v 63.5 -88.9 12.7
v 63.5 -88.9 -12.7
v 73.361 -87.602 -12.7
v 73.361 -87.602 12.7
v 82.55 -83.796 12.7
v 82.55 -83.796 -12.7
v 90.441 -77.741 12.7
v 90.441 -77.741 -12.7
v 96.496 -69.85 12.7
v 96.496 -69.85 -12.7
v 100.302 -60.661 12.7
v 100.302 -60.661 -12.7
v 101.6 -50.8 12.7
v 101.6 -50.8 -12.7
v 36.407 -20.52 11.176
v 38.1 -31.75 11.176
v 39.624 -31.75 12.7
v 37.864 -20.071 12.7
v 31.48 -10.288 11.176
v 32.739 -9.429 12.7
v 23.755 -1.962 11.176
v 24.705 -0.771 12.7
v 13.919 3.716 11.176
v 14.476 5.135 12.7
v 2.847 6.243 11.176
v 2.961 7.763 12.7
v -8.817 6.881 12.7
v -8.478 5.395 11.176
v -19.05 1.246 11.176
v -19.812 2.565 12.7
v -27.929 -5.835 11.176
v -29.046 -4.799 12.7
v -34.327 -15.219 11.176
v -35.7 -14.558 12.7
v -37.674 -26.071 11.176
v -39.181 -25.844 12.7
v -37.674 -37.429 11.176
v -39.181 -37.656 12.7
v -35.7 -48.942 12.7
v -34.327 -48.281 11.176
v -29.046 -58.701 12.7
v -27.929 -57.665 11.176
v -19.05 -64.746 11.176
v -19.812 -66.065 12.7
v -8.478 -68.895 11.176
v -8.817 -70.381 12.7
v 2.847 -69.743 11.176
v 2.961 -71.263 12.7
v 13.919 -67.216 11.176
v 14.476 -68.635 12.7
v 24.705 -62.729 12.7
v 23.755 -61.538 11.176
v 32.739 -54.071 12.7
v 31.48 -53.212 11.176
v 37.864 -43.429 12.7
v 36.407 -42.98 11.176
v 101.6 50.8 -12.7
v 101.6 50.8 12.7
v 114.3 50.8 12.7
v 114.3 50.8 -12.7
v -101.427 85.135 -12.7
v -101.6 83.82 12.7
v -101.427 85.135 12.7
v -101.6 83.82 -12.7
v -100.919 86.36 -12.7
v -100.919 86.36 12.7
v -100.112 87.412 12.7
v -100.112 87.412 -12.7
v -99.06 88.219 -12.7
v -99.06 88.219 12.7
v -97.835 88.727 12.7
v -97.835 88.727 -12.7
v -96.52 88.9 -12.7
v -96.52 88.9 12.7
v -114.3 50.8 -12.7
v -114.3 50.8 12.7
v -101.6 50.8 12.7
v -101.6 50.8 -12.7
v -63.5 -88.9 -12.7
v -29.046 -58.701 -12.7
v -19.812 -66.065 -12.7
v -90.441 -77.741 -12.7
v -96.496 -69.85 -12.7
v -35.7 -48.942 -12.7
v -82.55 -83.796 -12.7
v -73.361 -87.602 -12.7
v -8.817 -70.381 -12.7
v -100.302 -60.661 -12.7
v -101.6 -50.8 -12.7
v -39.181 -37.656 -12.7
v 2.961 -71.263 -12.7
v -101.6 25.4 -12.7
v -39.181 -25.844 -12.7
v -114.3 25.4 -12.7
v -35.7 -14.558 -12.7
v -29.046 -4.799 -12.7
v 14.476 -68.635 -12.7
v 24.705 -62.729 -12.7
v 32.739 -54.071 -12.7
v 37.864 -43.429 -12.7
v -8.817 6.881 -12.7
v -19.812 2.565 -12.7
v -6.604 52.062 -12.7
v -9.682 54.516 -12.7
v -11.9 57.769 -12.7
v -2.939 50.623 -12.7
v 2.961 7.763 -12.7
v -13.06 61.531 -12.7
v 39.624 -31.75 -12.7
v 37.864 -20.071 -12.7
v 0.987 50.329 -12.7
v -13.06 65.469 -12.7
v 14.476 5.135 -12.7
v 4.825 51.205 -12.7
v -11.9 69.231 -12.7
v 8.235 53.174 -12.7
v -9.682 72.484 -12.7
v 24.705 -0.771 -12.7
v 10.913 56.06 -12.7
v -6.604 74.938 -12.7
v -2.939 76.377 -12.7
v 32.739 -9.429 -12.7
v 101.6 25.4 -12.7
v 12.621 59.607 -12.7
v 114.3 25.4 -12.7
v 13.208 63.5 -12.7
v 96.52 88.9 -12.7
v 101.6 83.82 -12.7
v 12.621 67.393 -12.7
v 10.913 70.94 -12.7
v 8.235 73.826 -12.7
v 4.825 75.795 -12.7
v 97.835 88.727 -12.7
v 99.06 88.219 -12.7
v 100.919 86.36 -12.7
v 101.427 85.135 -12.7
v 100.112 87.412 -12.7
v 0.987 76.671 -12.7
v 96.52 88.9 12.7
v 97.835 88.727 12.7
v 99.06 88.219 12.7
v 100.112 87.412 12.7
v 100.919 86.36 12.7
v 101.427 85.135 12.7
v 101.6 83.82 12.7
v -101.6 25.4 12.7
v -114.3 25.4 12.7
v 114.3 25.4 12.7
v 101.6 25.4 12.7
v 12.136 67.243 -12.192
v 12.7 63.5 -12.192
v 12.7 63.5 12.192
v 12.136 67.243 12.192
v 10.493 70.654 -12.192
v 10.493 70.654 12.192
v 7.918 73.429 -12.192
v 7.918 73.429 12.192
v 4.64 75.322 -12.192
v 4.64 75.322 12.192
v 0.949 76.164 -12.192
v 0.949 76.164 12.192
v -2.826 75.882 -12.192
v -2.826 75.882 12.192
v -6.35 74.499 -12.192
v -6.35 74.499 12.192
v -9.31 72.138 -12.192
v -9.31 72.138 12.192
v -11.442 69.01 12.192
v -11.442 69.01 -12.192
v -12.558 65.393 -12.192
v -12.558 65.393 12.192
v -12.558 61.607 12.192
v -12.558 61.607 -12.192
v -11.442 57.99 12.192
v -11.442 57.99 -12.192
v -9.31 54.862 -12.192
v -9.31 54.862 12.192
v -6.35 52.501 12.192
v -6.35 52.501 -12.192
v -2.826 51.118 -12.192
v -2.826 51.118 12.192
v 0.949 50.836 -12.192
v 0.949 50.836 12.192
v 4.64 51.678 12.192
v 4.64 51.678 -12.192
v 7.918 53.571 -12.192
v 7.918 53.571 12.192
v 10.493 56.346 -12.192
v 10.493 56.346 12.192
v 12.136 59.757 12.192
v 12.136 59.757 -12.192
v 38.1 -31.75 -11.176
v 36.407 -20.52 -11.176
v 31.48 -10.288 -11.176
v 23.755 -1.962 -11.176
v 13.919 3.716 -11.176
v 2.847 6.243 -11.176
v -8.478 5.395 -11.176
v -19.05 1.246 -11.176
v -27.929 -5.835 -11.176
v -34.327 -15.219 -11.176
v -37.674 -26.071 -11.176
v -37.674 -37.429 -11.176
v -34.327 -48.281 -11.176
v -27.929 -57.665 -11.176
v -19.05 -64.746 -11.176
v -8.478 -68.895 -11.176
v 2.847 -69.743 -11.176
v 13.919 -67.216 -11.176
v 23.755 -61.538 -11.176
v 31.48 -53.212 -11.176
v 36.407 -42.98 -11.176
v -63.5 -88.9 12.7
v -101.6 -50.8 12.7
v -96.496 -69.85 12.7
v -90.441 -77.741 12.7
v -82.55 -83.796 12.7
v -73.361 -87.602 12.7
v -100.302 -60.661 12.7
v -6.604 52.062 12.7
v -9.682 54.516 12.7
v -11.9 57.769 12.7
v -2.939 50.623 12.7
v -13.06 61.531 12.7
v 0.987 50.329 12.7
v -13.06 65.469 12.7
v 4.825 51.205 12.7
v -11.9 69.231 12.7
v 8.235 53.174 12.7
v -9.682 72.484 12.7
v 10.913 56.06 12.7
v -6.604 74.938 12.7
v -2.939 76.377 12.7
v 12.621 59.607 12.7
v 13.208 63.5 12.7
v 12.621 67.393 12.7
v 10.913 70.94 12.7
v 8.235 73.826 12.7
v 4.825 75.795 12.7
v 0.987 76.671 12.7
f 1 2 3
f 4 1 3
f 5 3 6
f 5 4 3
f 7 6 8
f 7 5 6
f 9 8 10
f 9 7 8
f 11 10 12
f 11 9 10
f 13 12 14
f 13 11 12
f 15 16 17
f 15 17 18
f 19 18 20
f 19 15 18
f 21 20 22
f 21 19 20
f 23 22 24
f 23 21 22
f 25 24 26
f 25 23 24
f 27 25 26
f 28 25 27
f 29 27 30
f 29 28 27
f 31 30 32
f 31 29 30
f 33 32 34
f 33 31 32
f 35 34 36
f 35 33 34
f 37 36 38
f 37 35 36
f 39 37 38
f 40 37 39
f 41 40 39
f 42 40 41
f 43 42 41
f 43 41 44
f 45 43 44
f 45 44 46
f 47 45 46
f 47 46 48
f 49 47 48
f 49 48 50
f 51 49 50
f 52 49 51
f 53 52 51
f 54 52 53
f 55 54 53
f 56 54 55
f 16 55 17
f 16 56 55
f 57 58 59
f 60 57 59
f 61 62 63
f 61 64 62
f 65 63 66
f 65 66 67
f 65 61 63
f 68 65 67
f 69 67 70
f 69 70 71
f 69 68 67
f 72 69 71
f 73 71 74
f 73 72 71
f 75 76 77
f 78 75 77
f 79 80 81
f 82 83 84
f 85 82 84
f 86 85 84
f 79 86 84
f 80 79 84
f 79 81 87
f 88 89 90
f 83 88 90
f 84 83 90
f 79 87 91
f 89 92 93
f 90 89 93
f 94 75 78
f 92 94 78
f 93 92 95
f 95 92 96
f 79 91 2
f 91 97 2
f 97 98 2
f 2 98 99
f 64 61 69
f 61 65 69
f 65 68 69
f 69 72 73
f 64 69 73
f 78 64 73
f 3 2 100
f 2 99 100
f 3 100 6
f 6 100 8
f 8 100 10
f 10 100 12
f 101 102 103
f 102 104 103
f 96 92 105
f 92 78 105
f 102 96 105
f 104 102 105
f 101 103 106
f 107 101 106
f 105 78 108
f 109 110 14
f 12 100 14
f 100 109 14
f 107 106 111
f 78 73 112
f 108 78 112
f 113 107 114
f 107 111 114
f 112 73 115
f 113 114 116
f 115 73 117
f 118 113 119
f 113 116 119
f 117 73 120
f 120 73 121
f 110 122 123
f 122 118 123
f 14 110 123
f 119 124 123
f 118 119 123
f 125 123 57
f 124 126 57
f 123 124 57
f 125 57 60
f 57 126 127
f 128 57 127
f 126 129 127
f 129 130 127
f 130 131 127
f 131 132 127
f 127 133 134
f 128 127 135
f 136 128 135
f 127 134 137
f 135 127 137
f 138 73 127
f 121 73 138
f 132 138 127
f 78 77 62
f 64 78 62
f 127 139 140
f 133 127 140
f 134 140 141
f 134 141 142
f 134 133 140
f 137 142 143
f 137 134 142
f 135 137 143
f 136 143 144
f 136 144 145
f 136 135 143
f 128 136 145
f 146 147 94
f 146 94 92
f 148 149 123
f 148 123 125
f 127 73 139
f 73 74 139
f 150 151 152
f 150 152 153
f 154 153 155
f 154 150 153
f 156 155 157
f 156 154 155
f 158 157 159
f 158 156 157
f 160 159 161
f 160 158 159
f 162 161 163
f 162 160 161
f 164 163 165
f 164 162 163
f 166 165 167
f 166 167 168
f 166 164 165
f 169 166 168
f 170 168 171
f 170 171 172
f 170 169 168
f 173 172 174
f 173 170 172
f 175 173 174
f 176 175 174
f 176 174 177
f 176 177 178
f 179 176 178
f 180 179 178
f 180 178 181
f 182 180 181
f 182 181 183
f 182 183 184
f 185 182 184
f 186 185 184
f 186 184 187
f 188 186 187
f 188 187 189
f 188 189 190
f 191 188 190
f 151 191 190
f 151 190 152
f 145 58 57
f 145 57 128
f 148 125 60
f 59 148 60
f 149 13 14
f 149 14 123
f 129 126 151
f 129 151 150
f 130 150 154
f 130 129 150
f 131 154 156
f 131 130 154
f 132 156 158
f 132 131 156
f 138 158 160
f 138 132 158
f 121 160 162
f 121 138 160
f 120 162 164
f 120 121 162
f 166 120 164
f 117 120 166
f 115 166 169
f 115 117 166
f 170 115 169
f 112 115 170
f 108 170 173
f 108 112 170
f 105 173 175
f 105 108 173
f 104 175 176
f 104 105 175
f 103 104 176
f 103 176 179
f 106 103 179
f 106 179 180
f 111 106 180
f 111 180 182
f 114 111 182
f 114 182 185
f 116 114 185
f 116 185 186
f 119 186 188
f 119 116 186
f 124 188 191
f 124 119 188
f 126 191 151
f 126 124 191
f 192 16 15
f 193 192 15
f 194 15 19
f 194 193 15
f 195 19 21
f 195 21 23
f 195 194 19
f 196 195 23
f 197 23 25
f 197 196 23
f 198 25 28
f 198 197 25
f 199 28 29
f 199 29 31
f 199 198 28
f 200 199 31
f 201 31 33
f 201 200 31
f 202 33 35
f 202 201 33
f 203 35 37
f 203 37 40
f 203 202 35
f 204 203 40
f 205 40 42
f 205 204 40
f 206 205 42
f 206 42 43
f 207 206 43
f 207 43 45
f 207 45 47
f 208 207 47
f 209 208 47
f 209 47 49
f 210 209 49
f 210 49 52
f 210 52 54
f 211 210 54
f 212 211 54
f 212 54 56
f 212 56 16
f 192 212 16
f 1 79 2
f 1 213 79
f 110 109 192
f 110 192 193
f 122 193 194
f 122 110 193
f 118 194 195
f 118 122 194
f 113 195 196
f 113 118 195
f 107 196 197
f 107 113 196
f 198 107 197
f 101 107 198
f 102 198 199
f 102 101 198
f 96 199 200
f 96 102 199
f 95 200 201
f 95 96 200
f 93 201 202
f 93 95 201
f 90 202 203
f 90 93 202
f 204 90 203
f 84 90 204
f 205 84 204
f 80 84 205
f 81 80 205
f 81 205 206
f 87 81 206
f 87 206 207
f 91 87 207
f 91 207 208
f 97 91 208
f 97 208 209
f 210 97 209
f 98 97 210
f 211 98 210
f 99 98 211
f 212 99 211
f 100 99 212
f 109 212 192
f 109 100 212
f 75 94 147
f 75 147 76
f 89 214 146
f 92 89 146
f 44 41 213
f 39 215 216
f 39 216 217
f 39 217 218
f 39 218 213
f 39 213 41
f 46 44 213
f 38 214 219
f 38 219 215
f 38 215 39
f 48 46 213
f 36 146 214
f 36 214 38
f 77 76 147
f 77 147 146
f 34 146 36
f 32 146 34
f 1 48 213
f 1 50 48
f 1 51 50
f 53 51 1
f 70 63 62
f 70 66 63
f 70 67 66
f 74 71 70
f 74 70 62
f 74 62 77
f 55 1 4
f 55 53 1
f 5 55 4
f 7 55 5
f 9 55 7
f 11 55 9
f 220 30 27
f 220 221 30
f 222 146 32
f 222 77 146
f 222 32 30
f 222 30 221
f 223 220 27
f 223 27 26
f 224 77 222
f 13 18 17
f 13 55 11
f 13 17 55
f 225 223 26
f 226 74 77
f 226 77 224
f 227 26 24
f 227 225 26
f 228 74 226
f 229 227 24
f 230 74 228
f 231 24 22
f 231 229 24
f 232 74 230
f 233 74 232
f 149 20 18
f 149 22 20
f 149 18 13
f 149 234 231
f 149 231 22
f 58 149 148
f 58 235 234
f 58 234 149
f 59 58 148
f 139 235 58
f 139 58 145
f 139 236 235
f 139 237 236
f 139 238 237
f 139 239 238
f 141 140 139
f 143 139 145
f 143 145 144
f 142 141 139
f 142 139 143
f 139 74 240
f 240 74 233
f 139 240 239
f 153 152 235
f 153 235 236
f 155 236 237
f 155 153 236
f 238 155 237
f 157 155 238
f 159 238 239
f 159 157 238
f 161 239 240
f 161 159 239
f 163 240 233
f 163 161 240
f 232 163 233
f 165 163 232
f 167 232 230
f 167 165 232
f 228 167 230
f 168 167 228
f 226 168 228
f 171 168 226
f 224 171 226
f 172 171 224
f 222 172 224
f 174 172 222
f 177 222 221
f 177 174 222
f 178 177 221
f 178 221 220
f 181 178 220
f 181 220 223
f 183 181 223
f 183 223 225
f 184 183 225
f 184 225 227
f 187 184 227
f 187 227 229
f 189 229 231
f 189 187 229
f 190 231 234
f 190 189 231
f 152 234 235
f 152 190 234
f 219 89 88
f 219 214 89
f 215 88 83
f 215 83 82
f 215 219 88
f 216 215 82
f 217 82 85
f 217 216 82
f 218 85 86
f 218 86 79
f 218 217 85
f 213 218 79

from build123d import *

# Parameters (mm, degrees)
F0_W     = 203.2
F0_H     = 177.8
F0_R     = 38.1
F0_R_2   = 12.7
F1_DEPTH = 12.7
F2_SIZE  = 0.508
F3_SIZE  = 1.524
F4_R     = 38.1
F5_R     = 5.08
F6_W     = 12.7
F6_H     = 25.4
F7_DEPTH = 25.4


with BuildPart() as f1:
    # F0 (on Top) → F1 (new body, symmetric)
    with BuildSketch(Plane.XY):
        Rectangle(F0_W, F0_H)
        with Locations((0, -31.75)):
            Circle(F0_R, mode=Mode.SUBTRACT)
        with Locations((0, 63.5)):
            Circle(F0_R_2, mode=Mode.SUBTRACT)
    extrude(amount=F1_DEPTH, both=True)

    # F2
    f2_edges = [f1.edges().sort_by_distance(p)[0] for p in [
        (-12.7, 63.5, 12.7),
        (-12.7, 63.5, -12.7),
    ]]
    chamfer(f2_edges, length=F2_SIZE)

    # F3
    f3_edges = [f1.edges().sort_by_distance(p)[0] for p in [
        (-38.1, -31.75, 12.7),
        (-38.1, -31.75, -12.7),
    ]]
    chamfer(f3_edges, length=F3_SIZE)

    # F4
    f4_edges = [f1.edges().sort_by_distance(p)[0] for p in [
        (-101.6, -88.9, 0),
        (101.6, -88.9, 0),
    ]]
    fillet(f4_edges, radius=F4_R)

    # F5
    f5_edges = [f1.edges().sort_by_distance(p)[0] for p in [
        (101.6, 88.9, 0),
        (-101.6, 88.9, 0),
    ]]
    fillet(f5_edges, radius=F5_R)

    # F6 (on face) → F7 (join)
    with BuildSketch(Plane.XY.offset(12.7)):
        with Locations((-107.95, 38.1)):
            Rectangle(F6_W, F6_H)
        with Locations((107.95, 38.1)):
            Rectangle(F6_W, F6_H)
    extrude(amount=-F7_DEPTH)


solid = f1.part
